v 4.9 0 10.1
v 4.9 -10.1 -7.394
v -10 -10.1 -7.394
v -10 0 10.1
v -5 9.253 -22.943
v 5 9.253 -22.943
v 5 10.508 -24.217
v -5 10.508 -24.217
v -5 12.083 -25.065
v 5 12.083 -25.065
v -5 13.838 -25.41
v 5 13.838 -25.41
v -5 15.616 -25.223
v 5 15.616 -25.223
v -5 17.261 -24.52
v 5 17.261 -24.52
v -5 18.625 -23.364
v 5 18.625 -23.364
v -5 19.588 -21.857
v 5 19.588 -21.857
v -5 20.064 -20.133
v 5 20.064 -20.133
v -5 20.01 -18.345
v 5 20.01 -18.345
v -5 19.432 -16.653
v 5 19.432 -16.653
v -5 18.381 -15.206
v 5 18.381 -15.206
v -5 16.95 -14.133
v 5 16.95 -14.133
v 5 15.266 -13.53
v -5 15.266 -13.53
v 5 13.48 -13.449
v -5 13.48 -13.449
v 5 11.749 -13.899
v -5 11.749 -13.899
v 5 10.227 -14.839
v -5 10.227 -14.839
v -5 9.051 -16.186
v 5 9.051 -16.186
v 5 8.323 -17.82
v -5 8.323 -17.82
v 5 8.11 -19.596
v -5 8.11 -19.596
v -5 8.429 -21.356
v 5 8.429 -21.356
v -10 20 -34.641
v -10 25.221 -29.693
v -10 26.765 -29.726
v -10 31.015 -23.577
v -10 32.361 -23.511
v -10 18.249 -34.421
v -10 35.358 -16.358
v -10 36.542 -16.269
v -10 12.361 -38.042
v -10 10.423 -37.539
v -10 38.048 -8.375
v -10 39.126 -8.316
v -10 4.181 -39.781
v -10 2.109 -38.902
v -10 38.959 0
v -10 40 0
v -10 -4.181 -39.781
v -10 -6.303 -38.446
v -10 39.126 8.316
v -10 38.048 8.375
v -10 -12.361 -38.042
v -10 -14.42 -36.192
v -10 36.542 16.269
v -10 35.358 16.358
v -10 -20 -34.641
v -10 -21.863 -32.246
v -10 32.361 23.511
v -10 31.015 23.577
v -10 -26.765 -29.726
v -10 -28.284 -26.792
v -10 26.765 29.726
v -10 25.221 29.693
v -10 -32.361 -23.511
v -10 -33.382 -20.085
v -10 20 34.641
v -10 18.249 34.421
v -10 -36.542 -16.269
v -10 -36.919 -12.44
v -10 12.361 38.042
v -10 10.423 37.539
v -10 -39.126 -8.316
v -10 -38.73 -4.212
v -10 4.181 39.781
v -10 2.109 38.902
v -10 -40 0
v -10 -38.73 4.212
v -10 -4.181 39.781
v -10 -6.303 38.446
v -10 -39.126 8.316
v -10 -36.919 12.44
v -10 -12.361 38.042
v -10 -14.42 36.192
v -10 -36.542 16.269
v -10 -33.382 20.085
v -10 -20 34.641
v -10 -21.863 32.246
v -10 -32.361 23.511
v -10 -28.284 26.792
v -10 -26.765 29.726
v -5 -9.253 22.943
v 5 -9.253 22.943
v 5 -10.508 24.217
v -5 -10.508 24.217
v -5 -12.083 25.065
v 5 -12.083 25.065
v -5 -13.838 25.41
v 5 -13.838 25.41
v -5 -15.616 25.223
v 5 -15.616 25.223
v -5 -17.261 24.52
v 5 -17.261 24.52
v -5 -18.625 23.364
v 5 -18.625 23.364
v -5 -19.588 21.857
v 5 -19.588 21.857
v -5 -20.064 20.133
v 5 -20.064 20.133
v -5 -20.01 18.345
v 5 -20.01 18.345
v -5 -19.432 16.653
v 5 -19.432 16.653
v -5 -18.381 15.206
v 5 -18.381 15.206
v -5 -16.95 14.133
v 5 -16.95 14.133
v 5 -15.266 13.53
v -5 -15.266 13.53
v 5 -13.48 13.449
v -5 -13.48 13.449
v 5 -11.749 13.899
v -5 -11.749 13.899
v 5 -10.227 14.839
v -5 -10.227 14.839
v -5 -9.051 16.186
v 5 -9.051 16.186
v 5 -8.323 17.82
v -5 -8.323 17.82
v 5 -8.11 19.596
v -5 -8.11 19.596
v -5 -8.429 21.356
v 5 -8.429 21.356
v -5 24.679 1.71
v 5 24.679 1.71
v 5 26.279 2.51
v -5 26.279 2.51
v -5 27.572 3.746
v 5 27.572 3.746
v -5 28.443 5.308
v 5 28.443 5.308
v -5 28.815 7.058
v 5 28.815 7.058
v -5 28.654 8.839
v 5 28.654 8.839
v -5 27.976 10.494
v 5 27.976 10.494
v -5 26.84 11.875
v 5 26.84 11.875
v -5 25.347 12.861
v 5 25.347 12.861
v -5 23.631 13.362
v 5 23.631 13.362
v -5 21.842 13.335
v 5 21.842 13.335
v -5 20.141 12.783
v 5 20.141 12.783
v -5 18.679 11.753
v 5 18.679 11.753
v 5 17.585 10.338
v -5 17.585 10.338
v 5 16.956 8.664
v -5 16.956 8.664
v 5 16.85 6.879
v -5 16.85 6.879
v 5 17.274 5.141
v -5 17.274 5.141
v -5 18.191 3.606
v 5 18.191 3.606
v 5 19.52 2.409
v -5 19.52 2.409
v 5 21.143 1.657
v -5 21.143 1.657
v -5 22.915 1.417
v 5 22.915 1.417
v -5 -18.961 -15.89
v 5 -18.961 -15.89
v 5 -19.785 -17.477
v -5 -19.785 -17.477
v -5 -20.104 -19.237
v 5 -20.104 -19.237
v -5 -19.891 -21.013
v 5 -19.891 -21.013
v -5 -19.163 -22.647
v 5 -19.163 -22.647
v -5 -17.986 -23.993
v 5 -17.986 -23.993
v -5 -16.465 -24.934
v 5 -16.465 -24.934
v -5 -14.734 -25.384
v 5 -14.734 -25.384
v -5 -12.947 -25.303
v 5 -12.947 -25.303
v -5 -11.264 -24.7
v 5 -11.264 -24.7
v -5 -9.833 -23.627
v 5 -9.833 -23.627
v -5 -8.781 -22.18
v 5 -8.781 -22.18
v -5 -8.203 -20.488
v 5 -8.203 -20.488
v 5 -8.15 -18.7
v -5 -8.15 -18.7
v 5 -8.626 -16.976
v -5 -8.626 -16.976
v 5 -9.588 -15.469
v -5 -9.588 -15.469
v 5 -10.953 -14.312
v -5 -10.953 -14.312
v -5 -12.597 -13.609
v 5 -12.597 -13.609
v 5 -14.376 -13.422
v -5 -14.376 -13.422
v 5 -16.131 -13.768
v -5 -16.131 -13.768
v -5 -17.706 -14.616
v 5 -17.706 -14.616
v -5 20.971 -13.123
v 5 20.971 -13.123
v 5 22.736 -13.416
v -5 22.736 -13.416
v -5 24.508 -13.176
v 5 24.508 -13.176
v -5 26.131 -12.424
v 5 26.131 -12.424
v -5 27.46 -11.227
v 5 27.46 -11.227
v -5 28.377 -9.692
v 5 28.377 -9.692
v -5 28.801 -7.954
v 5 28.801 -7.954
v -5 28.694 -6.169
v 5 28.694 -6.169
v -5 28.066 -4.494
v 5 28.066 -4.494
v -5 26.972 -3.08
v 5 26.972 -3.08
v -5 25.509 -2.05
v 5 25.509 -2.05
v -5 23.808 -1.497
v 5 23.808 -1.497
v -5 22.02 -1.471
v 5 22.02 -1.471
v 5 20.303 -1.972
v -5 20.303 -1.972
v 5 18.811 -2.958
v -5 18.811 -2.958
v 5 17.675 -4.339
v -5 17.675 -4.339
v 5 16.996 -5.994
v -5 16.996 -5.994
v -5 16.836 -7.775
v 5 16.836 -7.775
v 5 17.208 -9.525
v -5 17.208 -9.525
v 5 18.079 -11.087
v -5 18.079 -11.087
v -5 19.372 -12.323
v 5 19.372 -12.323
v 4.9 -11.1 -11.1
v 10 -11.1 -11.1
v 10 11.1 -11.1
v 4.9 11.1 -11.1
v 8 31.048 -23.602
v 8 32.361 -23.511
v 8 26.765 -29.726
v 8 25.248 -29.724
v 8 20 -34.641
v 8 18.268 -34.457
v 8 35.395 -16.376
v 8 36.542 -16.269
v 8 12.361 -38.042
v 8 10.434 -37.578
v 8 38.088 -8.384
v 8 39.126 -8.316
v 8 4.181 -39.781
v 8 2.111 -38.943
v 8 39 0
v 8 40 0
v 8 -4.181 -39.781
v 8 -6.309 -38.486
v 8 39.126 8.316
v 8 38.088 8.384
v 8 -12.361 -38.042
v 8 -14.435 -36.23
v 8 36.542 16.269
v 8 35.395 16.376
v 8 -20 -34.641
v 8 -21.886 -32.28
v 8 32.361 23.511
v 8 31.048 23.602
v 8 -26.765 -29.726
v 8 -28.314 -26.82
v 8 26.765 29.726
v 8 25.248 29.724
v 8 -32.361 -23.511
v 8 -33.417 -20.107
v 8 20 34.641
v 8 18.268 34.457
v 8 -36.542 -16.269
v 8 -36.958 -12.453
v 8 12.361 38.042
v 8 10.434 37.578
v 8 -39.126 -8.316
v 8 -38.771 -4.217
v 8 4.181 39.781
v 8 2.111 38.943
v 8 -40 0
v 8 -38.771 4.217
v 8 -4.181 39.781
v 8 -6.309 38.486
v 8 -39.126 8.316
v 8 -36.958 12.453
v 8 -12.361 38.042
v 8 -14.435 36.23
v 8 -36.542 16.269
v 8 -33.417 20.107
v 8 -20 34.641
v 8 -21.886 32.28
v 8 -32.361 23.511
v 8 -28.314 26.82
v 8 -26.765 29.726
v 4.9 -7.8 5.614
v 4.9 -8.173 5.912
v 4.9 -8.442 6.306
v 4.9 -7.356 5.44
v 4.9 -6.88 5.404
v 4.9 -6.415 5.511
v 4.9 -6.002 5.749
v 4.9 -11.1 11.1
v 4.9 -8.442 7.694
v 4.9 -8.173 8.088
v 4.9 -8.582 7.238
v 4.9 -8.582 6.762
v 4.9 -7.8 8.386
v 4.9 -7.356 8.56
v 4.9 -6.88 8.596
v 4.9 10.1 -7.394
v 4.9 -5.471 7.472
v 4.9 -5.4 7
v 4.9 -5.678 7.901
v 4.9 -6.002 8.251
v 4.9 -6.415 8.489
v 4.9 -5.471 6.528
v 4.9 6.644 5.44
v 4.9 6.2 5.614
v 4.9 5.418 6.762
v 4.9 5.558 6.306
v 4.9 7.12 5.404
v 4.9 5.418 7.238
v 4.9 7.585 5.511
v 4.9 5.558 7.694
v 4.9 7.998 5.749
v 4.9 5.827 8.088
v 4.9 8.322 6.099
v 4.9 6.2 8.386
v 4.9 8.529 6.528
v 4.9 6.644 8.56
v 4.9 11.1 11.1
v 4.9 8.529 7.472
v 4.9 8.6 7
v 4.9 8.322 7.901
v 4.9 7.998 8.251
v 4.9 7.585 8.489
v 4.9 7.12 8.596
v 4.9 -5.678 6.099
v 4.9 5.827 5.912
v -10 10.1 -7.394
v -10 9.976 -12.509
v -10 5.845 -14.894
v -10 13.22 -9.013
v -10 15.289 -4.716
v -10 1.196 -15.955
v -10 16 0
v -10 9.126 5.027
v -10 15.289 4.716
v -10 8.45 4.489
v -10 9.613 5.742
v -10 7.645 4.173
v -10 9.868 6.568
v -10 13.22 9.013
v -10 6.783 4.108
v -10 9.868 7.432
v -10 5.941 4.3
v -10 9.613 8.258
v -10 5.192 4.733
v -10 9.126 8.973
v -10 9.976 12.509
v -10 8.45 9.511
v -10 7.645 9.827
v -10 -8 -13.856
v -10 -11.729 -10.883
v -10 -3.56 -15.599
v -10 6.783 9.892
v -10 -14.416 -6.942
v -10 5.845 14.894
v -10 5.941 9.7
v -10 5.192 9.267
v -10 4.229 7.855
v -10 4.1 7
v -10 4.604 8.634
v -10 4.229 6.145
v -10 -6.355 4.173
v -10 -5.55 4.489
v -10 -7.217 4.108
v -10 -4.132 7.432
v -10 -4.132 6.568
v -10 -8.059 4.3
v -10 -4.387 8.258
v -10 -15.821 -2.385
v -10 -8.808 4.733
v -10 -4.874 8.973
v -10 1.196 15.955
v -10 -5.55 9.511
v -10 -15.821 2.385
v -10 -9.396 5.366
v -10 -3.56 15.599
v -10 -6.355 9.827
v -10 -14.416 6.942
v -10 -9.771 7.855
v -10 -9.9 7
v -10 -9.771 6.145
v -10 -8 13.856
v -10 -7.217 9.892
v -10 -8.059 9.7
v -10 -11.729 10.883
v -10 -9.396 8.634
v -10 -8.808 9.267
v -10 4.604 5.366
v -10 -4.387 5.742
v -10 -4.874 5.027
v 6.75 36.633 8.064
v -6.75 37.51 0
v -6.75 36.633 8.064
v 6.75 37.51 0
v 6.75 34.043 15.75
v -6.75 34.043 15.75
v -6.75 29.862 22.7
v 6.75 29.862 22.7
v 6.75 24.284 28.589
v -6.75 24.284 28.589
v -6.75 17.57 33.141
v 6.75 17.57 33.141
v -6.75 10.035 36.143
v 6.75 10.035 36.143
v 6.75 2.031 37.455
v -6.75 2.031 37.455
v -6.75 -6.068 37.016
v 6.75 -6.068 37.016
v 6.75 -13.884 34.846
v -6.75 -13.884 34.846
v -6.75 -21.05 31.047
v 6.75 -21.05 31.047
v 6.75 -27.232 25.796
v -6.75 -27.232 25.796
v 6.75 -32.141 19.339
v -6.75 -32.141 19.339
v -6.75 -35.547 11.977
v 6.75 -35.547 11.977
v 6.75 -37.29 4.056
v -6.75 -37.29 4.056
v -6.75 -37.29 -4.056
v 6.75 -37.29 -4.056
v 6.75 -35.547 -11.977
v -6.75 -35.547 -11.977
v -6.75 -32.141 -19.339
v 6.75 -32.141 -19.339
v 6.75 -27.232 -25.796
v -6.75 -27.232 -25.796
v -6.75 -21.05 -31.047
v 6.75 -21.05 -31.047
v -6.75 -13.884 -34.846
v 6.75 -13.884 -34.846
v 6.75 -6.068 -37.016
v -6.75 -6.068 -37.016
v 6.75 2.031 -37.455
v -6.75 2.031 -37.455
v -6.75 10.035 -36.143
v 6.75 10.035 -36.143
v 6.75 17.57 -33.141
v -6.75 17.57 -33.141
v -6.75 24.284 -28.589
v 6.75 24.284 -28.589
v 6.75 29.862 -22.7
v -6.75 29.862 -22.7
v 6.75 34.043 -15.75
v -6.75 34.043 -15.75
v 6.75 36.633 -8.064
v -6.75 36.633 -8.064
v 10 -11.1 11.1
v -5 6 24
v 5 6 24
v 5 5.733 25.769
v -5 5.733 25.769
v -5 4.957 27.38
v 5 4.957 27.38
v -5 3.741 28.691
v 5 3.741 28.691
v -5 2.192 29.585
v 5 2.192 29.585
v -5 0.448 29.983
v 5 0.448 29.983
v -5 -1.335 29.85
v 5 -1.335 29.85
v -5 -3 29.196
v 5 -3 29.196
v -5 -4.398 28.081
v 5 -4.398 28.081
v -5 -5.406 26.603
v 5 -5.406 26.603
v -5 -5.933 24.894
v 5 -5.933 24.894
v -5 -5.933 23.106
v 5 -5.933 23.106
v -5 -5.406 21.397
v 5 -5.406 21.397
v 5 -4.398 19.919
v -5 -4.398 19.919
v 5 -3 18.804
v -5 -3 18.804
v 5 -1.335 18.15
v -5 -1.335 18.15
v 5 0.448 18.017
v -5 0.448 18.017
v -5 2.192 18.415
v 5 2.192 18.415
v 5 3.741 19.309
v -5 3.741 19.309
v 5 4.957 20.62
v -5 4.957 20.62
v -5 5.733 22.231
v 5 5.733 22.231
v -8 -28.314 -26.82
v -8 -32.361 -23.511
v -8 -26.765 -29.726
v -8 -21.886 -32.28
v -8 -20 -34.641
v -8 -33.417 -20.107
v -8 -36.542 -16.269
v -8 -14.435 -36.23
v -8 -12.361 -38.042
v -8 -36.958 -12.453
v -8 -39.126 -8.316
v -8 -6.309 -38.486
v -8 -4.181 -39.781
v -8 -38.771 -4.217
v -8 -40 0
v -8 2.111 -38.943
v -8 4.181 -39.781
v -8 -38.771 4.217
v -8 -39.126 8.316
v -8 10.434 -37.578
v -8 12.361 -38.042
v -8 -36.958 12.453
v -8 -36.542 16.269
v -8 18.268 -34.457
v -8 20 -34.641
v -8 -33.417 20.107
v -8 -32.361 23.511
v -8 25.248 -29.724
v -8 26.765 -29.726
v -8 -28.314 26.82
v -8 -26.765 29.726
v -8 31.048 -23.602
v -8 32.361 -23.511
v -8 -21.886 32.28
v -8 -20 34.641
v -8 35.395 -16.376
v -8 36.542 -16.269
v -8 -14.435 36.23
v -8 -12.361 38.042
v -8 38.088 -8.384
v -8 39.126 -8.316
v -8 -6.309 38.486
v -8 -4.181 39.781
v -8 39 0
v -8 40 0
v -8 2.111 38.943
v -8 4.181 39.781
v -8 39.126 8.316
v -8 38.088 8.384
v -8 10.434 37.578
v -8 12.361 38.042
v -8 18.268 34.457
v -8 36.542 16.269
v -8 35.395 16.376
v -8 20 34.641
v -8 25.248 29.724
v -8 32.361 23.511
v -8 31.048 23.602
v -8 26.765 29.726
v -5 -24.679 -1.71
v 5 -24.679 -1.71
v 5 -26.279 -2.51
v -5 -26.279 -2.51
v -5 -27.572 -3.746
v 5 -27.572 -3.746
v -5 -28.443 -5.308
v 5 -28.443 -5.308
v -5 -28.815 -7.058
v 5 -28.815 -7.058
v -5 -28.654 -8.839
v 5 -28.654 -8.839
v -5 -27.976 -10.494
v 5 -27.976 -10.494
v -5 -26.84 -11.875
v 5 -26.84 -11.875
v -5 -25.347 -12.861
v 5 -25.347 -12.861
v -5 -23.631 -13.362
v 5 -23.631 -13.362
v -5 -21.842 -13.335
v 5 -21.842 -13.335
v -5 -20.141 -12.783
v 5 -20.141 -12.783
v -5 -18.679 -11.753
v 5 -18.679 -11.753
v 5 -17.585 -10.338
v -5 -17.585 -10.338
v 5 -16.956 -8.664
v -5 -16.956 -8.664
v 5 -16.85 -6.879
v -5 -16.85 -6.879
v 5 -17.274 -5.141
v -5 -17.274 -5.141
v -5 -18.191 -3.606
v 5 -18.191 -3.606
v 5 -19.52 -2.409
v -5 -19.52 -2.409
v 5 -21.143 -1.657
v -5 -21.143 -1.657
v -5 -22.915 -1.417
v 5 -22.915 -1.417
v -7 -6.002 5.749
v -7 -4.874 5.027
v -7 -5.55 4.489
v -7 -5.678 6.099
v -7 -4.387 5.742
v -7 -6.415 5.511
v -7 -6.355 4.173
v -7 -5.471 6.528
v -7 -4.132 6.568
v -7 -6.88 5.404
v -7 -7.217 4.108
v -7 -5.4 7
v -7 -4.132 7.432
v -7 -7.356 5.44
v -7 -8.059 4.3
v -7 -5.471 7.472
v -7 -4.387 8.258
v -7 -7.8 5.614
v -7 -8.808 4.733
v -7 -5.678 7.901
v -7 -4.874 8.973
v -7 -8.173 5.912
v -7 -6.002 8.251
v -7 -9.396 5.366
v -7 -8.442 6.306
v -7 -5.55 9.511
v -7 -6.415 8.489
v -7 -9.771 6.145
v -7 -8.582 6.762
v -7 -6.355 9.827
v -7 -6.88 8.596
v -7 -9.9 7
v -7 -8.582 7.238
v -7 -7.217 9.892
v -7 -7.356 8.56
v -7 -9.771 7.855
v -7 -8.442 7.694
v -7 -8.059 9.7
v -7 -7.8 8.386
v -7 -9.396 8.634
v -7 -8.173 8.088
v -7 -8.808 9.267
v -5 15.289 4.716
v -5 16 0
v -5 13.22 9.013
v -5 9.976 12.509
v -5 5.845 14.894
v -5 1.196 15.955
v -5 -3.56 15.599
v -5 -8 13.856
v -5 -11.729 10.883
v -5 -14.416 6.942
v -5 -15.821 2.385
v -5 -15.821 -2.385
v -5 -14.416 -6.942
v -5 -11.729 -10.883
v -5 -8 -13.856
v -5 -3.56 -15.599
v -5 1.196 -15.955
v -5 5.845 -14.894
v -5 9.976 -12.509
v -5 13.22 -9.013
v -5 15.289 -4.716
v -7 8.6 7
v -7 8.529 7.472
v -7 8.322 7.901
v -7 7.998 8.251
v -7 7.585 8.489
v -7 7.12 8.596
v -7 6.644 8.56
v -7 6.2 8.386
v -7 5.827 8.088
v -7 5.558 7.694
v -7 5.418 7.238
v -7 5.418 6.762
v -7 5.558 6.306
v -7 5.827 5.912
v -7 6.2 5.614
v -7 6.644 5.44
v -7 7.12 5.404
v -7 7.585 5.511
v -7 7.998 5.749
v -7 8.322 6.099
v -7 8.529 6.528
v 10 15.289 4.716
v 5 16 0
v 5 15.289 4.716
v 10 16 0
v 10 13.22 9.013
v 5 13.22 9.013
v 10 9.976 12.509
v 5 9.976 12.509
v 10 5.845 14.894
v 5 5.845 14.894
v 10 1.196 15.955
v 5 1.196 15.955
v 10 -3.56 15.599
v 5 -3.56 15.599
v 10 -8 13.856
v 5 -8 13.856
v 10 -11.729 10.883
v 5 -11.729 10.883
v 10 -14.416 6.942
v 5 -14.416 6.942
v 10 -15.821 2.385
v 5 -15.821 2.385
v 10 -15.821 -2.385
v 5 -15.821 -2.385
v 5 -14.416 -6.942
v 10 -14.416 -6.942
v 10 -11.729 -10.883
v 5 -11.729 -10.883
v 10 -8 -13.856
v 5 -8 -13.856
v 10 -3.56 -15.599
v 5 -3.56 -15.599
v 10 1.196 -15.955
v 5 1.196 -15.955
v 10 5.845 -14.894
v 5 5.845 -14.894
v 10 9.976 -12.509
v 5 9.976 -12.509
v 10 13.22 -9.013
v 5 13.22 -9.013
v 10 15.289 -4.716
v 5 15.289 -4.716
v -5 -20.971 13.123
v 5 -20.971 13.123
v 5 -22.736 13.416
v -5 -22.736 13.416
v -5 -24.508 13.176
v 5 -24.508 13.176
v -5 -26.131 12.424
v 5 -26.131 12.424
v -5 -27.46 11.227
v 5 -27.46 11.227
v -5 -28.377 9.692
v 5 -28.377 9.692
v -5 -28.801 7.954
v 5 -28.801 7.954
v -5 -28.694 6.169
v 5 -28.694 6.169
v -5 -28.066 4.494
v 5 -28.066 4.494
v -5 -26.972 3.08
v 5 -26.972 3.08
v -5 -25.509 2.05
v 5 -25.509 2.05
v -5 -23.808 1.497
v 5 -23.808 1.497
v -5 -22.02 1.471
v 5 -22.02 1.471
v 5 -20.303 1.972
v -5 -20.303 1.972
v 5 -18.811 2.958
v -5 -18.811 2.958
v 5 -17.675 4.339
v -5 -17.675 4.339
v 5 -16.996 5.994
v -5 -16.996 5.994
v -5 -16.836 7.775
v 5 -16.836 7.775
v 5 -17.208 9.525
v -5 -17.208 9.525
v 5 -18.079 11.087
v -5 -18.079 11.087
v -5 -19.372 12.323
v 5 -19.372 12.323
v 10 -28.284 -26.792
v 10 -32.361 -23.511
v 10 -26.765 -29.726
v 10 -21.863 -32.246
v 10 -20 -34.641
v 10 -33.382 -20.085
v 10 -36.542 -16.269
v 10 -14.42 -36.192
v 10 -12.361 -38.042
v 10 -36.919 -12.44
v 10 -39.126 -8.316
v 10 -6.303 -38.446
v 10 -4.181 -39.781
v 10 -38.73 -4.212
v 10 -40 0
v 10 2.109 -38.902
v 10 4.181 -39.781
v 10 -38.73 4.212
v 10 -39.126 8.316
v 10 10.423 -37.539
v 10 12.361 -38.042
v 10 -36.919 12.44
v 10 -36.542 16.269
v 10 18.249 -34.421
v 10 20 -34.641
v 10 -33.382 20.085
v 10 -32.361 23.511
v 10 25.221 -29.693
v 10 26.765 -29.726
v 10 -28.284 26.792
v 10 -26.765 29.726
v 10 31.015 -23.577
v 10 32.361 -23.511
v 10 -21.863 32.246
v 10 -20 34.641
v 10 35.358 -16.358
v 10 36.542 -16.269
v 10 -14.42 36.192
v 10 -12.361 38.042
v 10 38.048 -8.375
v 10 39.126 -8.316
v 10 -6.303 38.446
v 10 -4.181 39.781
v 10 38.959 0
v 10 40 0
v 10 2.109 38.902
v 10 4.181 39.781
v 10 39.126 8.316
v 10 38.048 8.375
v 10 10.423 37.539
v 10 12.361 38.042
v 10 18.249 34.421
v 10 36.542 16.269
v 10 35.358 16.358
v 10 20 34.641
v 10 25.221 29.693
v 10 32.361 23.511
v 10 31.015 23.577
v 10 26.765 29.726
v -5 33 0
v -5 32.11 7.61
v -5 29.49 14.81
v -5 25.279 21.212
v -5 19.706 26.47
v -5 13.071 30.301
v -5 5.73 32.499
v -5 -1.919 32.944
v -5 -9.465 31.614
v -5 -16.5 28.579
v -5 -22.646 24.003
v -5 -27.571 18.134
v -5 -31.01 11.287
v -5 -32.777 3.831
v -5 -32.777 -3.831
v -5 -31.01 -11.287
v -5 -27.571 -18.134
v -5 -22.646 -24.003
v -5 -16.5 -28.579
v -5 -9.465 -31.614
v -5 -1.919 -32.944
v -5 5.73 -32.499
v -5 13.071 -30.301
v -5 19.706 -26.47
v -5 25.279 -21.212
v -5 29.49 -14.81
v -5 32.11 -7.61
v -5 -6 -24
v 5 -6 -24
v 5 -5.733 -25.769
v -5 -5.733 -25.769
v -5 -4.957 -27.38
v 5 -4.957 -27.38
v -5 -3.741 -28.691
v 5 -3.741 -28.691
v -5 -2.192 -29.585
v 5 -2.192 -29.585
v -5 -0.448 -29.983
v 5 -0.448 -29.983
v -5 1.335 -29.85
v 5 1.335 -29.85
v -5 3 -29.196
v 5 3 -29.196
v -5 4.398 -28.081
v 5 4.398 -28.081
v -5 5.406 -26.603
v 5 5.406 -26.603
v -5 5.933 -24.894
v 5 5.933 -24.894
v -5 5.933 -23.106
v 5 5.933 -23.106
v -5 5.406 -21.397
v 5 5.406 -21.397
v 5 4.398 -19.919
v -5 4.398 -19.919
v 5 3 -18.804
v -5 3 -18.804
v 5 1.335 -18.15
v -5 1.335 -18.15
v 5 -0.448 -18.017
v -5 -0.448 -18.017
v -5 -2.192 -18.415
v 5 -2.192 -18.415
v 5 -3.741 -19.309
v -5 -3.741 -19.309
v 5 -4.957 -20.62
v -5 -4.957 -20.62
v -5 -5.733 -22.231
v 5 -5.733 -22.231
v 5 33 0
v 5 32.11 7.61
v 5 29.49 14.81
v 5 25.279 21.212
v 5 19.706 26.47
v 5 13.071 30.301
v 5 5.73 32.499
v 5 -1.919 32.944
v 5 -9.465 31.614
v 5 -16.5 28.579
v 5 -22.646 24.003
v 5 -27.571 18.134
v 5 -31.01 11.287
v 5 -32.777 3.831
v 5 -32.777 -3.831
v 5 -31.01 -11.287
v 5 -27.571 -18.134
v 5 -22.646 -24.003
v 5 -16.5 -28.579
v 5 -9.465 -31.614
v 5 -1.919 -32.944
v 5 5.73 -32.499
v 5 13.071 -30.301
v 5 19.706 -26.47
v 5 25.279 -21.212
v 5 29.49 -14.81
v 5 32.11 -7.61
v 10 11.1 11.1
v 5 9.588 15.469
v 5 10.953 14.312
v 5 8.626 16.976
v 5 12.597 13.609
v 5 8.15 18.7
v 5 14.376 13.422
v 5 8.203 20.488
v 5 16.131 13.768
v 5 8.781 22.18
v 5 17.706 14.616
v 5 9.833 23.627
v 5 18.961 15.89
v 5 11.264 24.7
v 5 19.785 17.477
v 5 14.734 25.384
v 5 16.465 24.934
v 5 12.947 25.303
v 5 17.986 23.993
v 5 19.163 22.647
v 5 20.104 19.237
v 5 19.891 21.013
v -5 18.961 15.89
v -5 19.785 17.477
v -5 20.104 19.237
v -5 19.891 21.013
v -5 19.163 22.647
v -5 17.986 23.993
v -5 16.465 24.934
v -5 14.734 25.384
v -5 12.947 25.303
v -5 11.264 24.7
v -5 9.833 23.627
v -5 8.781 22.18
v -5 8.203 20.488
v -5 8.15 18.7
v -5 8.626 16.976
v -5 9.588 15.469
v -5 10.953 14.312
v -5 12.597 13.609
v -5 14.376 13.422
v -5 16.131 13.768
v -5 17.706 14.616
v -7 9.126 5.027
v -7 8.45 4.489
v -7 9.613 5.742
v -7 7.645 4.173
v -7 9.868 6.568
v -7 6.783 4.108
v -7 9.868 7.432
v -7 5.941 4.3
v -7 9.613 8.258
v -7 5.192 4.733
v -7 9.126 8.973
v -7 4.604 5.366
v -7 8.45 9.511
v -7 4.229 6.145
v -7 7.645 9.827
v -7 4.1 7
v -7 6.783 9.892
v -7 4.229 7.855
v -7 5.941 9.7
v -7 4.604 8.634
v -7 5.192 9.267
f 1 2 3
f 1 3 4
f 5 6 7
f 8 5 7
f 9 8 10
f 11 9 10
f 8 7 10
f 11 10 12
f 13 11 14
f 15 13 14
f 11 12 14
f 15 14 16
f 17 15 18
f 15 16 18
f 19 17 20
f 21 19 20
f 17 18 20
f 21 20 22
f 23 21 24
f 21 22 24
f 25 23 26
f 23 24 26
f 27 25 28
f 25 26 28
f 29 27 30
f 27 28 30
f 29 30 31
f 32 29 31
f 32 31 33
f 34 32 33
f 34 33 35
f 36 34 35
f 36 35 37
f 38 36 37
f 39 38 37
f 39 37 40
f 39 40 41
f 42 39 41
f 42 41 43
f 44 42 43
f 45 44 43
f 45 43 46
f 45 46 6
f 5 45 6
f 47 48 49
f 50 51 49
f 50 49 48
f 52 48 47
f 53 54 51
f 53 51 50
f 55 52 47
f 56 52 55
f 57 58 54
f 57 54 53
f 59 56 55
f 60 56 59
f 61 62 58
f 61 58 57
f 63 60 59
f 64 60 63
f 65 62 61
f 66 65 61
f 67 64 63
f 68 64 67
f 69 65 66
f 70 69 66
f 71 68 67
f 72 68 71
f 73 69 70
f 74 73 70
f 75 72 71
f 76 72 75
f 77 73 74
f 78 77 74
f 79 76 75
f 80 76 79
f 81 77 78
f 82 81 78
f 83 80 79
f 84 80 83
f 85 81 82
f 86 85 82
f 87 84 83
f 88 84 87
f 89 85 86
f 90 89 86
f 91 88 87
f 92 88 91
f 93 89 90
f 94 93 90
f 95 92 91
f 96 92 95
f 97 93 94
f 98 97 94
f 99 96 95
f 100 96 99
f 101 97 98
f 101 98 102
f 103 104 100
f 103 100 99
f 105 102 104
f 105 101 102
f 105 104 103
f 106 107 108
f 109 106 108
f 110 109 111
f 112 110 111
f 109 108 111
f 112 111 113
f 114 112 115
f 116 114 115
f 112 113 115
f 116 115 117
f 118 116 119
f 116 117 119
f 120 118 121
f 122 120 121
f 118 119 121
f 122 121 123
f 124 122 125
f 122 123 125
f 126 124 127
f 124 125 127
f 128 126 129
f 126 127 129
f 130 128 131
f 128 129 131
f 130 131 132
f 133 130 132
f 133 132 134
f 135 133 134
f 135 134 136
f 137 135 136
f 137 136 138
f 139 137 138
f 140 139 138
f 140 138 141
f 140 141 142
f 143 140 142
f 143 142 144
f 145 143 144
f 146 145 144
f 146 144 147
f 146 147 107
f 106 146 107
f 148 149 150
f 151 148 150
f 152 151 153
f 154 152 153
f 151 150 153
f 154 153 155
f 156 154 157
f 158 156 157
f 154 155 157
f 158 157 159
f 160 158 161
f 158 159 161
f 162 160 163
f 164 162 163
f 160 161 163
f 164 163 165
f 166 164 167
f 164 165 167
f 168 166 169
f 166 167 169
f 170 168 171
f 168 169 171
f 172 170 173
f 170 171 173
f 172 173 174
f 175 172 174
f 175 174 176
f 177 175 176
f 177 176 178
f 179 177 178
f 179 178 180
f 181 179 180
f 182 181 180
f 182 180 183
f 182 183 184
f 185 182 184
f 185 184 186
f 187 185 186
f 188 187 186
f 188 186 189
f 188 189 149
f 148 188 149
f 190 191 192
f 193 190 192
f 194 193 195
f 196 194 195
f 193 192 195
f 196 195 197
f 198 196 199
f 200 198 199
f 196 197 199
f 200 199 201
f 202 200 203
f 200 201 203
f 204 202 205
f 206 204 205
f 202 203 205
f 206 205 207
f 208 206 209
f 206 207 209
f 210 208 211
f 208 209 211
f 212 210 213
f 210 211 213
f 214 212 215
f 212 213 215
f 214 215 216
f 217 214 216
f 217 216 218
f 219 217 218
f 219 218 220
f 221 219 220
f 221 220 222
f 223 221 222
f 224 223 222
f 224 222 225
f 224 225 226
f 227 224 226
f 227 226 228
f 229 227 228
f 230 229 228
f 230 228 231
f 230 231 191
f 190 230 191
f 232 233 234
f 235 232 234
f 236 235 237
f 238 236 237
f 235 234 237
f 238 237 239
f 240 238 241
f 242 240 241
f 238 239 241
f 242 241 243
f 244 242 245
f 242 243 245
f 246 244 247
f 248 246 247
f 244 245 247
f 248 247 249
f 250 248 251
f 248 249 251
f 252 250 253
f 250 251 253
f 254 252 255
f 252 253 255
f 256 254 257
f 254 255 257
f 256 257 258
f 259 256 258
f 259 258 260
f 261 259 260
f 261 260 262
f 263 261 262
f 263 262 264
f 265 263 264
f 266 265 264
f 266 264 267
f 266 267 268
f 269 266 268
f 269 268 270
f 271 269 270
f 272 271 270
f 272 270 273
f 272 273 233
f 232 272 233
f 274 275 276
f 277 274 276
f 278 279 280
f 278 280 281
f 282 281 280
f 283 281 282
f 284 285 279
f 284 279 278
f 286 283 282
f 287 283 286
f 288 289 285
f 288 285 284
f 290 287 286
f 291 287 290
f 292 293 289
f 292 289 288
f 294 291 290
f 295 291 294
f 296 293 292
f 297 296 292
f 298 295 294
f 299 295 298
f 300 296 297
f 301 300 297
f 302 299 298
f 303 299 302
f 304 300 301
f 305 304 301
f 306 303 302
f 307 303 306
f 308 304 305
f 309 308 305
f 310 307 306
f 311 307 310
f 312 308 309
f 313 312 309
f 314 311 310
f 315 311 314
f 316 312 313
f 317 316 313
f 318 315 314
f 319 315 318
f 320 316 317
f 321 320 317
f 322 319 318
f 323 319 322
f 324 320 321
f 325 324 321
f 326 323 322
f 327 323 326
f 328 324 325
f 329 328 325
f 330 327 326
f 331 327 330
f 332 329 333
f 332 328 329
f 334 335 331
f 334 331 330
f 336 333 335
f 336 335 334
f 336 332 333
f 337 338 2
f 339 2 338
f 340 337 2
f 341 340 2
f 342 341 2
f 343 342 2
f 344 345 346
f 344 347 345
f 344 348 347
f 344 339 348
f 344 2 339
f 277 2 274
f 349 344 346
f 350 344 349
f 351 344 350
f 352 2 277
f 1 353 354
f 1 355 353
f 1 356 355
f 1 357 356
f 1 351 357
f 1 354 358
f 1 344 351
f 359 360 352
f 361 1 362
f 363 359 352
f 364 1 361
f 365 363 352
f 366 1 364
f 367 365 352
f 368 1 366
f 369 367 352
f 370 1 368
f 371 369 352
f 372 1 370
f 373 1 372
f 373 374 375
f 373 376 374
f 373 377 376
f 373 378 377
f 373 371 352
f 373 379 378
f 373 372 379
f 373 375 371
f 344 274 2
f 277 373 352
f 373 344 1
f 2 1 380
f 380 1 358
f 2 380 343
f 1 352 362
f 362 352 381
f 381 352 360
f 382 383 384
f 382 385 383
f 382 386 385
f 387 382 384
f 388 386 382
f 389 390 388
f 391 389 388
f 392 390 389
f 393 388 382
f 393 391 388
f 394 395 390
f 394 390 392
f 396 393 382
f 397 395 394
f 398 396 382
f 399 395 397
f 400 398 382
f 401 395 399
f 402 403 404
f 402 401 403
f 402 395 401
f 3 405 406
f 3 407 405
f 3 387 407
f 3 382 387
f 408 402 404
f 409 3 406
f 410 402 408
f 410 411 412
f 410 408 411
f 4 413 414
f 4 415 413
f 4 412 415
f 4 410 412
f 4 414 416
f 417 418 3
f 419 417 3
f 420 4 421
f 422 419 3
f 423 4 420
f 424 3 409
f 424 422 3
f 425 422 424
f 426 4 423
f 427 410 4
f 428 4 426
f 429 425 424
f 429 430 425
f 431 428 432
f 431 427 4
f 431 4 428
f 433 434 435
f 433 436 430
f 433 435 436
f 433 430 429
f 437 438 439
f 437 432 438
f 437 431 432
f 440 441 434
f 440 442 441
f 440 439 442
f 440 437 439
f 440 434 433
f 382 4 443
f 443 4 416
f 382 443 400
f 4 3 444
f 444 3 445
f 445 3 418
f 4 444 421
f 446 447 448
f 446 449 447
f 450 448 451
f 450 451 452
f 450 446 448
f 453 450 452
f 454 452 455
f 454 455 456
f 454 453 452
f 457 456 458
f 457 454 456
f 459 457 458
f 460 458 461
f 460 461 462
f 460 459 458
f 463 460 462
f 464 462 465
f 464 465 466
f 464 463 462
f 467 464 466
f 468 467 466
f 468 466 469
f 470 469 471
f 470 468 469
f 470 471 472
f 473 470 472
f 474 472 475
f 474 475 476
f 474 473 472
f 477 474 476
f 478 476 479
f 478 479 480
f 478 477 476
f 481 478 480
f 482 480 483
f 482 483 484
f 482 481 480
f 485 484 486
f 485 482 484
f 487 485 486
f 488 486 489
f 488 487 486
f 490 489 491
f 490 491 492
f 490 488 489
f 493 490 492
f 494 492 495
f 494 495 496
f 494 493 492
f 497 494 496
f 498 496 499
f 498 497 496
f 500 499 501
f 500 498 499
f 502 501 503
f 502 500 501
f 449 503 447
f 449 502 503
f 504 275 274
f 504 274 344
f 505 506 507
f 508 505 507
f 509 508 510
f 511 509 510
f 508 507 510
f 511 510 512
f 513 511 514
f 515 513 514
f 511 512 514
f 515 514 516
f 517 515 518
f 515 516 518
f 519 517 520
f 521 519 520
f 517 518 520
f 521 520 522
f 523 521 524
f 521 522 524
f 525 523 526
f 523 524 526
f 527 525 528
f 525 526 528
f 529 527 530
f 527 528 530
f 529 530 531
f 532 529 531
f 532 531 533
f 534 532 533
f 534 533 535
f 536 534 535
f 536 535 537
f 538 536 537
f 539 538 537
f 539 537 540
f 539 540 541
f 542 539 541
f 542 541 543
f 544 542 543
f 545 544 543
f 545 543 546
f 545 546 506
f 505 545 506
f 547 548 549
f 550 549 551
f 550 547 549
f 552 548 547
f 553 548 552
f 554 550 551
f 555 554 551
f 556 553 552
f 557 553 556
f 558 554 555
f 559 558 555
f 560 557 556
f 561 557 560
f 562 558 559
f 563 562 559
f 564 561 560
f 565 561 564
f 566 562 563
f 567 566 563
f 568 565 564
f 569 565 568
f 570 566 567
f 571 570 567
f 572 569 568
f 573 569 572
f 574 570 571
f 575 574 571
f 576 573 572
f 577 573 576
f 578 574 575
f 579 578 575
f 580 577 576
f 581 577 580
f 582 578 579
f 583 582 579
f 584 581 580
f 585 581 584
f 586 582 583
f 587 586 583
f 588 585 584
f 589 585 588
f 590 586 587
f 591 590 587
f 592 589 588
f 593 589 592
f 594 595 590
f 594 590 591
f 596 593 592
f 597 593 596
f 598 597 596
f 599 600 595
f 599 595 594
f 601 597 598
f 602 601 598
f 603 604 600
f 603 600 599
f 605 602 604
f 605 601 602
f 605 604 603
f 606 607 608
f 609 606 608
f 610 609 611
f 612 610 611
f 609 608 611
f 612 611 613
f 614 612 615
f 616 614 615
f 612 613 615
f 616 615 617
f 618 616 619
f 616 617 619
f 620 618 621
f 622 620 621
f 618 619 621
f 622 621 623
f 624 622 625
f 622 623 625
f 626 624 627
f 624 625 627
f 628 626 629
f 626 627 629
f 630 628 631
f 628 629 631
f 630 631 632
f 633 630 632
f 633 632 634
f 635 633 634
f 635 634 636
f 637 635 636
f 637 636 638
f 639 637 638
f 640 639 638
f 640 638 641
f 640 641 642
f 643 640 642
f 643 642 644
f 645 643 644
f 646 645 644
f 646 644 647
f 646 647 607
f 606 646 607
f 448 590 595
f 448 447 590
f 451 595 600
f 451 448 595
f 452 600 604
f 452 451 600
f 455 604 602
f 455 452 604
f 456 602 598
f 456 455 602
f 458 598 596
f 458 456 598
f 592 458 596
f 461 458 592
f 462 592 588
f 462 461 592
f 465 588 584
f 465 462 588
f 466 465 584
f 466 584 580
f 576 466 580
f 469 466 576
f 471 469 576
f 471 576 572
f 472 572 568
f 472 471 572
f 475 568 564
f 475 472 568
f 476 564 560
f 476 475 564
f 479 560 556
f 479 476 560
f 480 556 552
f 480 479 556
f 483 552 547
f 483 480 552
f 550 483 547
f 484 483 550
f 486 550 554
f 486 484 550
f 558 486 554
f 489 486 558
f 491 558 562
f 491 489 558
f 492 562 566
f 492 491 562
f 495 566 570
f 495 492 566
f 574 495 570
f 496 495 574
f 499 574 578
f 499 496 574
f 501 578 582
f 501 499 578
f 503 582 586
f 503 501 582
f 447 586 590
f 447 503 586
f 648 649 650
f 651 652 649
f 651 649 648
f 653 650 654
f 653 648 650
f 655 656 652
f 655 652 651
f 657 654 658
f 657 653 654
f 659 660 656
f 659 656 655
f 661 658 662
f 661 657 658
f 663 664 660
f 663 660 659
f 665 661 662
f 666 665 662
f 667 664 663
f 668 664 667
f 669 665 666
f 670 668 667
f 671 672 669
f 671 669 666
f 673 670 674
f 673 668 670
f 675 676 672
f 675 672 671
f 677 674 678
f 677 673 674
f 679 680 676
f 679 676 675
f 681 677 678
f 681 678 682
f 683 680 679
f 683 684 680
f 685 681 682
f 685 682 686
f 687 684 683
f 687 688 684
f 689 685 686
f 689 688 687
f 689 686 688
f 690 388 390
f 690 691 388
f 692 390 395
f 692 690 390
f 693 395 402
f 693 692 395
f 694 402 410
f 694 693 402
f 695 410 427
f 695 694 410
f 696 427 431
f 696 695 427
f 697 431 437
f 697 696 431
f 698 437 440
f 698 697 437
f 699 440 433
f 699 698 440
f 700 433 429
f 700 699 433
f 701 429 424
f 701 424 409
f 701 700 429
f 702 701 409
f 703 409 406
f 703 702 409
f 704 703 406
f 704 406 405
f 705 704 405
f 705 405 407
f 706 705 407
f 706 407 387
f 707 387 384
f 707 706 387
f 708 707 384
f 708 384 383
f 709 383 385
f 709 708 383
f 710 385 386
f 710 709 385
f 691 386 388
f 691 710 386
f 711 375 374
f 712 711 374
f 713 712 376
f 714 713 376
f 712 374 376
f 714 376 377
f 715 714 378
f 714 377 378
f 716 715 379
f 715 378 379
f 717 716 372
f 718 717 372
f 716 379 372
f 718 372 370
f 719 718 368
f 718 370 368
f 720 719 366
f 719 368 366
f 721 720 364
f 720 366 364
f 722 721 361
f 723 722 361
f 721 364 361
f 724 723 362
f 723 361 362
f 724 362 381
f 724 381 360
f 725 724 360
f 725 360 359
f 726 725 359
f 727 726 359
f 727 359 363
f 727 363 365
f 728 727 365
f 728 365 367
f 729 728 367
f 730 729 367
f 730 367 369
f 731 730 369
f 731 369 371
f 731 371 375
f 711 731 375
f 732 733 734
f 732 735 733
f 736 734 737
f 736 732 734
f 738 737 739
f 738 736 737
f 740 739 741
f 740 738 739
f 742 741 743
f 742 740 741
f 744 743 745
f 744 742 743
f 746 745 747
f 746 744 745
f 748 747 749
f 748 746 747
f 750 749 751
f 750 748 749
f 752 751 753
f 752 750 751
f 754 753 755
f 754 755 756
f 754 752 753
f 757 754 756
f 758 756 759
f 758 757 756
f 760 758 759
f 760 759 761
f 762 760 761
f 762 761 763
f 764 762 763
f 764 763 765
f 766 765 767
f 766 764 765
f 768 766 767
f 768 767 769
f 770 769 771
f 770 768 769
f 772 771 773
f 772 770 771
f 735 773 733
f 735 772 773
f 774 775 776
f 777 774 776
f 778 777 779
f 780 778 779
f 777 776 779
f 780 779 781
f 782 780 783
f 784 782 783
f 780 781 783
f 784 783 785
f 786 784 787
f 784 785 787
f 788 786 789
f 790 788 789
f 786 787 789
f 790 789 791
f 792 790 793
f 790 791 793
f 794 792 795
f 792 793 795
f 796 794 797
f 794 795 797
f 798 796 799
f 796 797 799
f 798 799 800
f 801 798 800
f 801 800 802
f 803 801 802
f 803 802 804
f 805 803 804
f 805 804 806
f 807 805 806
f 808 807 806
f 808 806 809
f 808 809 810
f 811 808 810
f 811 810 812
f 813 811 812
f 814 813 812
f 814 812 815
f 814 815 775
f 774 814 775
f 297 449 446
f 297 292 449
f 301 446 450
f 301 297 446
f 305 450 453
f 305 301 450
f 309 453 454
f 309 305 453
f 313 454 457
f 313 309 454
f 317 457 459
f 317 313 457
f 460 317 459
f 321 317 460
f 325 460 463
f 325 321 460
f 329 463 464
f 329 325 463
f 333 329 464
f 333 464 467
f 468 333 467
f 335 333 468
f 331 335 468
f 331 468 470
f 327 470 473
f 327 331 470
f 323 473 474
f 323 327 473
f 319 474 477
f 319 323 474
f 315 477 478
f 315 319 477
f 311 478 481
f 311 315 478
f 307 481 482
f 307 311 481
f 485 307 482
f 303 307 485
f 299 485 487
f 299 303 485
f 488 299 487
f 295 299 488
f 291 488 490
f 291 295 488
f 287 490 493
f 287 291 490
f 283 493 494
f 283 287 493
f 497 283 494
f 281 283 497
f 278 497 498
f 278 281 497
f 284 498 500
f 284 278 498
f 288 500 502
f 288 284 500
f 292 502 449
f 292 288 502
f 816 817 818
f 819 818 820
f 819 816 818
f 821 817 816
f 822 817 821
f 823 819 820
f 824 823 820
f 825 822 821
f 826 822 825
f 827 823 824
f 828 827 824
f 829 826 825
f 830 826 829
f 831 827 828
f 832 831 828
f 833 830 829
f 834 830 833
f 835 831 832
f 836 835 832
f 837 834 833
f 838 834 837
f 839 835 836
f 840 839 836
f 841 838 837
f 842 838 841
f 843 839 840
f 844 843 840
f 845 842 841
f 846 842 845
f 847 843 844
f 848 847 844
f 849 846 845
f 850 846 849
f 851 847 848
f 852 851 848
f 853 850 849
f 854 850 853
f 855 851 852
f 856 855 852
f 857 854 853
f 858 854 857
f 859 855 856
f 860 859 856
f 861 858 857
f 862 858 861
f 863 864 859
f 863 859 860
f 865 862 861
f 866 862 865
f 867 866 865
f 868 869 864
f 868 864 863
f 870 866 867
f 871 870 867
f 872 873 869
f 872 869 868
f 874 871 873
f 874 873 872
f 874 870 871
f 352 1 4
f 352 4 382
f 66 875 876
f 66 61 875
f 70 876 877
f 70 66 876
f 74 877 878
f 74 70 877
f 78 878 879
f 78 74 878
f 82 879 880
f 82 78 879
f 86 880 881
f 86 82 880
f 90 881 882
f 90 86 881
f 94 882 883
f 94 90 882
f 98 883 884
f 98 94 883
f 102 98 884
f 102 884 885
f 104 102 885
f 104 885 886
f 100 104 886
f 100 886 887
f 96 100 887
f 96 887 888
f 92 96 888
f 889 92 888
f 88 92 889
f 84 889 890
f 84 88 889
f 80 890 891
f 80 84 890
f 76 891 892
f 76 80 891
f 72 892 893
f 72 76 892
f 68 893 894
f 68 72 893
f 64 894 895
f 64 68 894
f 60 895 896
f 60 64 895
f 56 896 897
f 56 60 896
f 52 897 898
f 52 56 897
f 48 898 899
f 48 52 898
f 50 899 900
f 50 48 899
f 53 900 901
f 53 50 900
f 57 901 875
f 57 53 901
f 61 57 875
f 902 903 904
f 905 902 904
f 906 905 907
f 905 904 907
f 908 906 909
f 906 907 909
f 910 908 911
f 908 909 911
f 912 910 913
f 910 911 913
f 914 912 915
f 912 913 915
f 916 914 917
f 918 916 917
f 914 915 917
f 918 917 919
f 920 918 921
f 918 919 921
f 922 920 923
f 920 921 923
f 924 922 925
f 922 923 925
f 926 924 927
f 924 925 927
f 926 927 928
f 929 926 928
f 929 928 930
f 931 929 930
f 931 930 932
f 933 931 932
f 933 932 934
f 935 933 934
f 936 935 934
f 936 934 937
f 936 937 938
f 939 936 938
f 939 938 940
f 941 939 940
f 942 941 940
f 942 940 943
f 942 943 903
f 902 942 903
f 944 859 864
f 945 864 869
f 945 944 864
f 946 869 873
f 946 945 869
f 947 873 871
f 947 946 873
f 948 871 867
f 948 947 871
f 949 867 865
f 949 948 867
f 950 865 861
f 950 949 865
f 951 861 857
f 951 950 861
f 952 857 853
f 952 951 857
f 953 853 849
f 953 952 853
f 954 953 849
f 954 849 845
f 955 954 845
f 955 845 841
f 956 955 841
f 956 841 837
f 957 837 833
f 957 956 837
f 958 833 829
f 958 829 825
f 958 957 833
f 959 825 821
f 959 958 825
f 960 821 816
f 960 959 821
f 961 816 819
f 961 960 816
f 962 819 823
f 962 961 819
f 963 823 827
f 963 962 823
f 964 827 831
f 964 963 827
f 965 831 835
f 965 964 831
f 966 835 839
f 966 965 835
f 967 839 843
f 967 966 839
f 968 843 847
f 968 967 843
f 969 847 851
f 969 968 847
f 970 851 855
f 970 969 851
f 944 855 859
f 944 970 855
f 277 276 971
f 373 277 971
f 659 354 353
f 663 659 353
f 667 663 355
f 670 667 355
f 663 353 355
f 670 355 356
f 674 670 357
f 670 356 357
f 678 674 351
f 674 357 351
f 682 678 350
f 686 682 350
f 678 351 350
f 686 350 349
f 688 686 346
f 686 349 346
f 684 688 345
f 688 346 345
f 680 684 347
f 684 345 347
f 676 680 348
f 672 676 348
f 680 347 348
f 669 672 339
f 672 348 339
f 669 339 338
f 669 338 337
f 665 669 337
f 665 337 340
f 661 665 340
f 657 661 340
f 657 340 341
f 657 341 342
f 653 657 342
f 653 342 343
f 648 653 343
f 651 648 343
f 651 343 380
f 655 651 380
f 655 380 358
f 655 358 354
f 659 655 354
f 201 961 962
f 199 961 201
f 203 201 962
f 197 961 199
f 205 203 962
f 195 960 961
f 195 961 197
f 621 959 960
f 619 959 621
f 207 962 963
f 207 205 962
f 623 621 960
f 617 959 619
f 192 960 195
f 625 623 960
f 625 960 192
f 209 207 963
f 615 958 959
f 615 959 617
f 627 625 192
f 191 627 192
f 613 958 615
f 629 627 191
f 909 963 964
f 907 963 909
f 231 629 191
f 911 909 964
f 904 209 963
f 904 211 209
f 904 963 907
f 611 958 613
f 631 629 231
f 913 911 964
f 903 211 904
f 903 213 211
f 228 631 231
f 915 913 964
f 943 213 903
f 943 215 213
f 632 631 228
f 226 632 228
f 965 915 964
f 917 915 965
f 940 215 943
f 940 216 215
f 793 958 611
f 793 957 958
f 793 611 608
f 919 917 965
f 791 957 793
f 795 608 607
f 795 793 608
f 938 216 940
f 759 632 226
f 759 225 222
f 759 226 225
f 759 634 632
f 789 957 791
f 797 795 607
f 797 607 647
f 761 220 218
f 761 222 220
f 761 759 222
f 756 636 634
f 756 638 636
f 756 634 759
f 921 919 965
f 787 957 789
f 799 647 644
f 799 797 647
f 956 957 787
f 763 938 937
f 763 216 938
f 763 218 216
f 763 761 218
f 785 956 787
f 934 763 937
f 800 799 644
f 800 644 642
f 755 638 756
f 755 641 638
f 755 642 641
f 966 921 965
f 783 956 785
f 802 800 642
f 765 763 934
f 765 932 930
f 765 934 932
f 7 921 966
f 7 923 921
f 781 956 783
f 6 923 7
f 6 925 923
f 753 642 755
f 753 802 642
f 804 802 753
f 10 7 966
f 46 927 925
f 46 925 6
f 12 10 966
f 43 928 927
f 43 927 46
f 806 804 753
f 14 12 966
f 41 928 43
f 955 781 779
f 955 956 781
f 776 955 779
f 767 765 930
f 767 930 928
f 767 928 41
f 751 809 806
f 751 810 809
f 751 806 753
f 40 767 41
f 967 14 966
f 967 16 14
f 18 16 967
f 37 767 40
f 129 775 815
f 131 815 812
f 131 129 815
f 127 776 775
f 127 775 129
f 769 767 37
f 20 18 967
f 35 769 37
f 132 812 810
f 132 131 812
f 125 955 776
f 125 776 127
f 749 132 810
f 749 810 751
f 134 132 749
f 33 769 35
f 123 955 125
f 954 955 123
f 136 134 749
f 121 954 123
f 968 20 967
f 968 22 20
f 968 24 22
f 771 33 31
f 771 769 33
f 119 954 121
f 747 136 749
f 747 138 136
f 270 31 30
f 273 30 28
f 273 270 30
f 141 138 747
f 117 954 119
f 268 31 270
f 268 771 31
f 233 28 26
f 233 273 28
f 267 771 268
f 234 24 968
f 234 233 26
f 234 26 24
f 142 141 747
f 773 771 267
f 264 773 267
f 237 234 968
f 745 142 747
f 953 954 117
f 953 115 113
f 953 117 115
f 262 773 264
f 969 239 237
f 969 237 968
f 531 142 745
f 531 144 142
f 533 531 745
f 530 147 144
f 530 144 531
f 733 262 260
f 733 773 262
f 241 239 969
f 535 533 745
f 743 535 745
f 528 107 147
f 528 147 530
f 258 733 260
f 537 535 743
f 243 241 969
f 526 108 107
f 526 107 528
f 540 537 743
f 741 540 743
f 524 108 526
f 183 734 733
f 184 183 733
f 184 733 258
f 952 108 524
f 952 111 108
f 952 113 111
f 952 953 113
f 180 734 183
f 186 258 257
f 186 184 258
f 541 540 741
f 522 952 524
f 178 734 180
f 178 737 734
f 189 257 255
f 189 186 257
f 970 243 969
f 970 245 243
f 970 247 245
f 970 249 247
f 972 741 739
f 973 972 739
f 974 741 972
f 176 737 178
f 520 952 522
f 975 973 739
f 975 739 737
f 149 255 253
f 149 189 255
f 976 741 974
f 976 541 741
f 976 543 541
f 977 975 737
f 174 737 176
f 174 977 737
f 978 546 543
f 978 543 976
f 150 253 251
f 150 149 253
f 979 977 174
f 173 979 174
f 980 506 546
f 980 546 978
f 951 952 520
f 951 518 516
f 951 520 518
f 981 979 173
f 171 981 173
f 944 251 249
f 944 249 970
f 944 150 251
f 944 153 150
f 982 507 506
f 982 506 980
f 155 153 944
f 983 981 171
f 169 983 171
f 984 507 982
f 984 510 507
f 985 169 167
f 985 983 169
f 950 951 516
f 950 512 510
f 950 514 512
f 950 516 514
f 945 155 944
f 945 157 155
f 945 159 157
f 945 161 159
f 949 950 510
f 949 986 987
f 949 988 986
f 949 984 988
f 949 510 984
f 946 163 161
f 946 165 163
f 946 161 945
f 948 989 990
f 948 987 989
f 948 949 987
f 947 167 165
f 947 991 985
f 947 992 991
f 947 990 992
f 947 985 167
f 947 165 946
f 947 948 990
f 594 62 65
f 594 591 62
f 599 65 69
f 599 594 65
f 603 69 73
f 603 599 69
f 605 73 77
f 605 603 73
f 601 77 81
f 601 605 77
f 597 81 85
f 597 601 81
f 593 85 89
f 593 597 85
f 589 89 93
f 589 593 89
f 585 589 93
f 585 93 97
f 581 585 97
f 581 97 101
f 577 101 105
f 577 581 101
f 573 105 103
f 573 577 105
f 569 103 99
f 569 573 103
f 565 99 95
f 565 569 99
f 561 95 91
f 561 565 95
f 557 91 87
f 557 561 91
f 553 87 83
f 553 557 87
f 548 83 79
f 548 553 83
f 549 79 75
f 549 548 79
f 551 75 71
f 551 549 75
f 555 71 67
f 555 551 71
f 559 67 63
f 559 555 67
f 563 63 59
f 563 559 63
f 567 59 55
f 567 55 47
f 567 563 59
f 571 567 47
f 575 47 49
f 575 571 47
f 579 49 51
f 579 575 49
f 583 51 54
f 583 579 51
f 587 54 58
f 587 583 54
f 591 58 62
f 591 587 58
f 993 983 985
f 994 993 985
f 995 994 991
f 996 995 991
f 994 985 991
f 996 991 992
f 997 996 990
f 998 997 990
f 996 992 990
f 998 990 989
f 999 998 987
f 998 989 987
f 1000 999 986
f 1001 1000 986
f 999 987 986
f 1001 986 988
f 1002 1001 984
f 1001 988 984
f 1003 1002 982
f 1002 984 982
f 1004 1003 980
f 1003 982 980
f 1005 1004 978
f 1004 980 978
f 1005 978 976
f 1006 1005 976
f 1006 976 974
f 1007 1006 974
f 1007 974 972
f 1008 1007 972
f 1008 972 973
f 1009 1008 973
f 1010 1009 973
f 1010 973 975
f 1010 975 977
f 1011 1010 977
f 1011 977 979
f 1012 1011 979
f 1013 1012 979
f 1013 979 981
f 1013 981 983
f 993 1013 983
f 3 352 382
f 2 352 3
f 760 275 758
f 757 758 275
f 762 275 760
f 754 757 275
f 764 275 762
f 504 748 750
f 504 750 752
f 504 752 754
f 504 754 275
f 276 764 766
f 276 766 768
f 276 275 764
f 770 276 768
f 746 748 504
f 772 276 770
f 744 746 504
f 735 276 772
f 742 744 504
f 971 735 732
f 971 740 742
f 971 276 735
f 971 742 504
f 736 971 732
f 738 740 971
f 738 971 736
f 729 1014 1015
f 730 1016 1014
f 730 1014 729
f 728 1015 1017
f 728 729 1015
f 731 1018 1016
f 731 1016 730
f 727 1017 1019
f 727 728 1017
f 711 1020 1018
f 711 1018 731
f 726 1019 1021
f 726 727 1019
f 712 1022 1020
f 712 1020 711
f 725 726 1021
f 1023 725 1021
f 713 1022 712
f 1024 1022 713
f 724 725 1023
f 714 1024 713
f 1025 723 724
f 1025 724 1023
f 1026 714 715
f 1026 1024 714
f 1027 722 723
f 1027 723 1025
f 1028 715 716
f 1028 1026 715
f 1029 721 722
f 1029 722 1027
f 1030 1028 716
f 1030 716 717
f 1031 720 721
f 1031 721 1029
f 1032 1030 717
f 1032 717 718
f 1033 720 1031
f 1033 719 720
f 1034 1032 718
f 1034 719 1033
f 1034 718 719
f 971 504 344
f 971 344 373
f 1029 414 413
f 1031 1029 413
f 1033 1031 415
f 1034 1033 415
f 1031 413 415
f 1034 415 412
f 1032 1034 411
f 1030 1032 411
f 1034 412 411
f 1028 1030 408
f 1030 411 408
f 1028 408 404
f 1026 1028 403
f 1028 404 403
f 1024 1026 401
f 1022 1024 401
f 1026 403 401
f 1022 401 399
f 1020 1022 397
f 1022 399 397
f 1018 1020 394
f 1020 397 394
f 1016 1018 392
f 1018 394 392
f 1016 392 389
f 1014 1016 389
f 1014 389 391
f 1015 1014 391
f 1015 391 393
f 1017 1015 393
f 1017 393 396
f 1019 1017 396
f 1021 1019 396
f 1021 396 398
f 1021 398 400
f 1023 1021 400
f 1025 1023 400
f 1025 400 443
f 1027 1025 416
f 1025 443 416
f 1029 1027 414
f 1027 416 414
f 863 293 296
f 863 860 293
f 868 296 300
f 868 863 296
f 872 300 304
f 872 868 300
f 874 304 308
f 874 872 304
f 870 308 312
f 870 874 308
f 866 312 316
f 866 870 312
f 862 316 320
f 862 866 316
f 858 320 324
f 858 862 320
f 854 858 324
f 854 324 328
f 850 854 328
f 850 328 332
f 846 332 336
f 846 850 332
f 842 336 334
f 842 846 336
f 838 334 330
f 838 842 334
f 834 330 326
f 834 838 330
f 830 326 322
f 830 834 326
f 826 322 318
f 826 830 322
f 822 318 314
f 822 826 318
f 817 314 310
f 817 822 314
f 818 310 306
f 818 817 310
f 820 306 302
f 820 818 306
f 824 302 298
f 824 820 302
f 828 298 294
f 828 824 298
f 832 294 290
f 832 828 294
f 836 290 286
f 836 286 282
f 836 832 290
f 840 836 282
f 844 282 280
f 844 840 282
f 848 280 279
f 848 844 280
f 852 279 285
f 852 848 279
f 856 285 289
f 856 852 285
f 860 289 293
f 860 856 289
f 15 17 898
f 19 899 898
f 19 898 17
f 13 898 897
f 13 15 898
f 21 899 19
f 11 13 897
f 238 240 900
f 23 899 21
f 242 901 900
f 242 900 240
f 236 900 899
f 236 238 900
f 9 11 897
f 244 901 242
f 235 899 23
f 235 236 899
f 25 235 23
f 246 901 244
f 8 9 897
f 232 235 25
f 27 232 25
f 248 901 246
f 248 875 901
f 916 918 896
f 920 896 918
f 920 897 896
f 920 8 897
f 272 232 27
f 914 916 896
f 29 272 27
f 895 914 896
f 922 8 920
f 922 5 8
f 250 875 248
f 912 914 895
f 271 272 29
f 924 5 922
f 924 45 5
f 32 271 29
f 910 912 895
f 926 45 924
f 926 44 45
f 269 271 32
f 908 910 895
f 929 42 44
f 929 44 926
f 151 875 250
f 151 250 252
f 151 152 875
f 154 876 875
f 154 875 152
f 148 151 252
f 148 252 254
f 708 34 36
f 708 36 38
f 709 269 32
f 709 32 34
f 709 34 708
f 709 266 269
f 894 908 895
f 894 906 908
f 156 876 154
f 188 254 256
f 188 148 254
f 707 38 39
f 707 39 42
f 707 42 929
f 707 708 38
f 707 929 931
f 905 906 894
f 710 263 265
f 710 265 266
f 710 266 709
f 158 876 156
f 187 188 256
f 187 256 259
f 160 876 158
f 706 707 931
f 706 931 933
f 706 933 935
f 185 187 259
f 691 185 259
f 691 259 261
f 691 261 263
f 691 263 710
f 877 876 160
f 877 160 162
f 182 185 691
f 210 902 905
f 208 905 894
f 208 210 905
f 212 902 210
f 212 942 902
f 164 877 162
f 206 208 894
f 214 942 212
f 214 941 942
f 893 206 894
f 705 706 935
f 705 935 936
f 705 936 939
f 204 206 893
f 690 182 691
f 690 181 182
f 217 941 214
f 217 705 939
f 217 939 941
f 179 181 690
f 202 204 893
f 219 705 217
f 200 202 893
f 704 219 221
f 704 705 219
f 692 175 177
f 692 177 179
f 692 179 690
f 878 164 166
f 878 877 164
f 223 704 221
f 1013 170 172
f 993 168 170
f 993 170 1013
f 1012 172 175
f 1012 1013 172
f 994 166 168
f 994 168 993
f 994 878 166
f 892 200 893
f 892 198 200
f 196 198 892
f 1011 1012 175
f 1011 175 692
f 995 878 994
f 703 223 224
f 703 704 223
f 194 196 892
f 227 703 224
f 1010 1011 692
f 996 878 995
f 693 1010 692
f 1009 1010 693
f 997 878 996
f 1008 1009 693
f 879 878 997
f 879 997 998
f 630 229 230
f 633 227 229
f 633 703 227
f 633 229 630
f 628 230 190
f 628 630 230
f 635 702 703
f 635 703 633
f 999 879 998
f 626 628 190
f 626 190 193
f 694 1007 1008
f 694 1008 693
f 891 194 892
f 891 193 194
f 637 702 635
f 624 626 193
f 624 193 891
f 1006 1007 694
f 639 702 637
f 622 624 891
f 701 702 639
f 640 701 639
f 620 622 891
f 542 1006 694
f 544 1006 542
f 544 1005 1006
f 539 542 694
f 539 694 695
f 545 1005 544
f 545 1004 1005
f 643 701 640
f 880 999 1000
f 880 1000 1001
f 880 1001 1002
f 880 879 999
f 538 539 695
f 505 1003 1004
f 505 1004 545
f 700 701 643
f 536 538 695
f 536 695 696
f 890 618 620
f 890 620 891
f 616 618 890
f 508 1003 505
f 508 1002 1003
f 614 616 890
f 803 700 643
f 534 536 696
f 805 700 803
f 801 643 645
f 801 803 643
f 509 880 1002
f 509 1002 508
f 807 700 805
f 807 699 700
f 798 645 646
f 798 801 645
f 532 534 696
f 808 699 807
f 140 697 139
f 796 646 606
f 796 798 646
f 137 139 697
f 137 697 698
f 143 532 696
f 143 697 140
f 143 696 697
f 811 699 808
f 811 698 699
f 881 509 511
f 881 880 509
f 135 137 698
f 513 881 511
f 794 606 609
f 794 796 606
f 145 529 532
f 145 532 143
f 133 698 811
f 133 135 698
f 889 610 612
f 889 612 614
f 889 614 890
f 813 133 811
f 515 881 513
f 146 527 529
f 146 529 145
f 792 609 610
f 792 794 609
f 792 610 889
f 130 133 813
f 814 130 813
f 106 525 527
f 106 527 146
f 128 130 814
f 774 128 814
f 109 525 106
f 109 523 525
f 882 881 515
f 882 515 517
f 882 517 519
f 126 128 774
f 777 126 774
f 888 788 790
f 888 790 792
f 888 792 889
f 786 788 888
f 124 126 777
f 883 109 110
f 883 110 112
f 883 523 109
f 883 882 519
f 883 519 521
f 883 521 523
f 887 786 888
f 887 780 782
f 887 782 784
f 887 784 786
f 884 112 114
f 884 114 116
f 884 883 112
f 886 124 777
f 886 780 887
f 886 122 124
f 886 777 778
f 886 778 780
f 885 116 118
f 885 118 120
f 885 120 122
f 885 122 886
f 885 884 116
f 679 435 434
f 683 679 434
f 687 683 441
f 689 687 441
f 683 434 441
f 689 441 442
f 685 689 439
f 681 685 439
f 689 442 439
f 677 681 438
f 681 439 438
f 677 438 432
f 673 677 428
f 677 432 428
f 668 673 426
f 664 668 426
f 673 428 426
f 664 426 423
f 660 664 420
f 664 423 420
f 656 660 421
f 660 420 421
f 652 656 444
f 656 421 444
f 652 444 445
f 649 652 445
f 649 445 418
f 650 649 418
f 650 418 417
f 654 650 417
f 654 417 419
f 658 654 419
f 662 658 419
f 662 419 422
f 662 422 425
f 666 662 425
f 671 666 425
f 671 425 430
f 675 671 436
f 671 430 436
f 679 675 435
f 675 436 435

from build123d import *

# Parameters (mm, degrees)
SKETCH001_R        = 1.6
POCKET_DEPTH       = 20.001
SKETCH003_W        = 22.2
SKETCH003_H        = 22.2
POCKET001_DEPTH    = 5.1
SKETCH004_R        = 2.9
POCKET002_DEPTH    = 3
SKETCH005_R        = 6
POCKET003_DEPTH    = 244.783506
POLARPATTERN_COUNT = 10


with BuildPart() as part:
    # Sketch → Revolution (revolve)
    with BuildSketch(Plane.XY):
        Polygon((8, 39), (8, 40), (10, 40), (10, 38.958768), (5, 33), (5, 16), (10, 16), (10, 1), (-10, 1), (-10, 16), (-5, 16), (-5, 33), (-10, 38.958768), (-10, 40), (-8, 40), (-8, 39), (-6.75, 37.510308), (6.75, 37.510308), align=None)
    revolve(axis=Axis((0, 0, 0), (1, 0, 0)))

    # Sketch001 (on Face7 of Revolution) → Pocket (cut, through all)
    with BuildSketch(Plane.YZ.offset(10)):
        with Locations((-7, 7)):
            Circle(SKETCH001_R)
        with Locations((7, 7)):
            Circle(SKETCH001_R)
        Polygon((-10.1, -7.393713), (0, 10.1), (10.1, -7.393713), align=None)
    extrude(amount=-POCKET_DEPTH, mode=Mode.SUBTRACT)

    # Sketch003 (on Face13 of Pocket) → Pocket001 (cut)
    with BuildSketch(Plane.YZ.offset(10)):
        Rectangle(SKETCH003_W, SKETCH003_H)
    extrude(amount=-POCKET001_DEPTH, mode=Mode.SUBTRACT)

    # Sketch004 (on Face27 of Pocket001) → Pocket002 (cut)
    with BuildSketch(Plane(origin=(-10, 0, 0), x_dir=(0, -1, 0), z_dir=(-1, 0, 0))):
        with Locations((-7, 7)):
            Circle(SKETCH004_R)
        with Locations((7, 7)):
            Circle(SKETCH004_R)
    extrude(amount=-POCKET002_DEPTH, mode=Mode.SUBTRACT)

    # Sketch005 (on Face9 of Pocket002) → Pocket003 (cut, through all)
    with BuildSketch(Plane.YZ.offset(5)):
        with Locations((0, 24)):
            Circle(SKETCH005_R)
    pocket003 = extrude(amount=-POCKET003_DEPTH, mode=Mode.SUBTRACT)

    # PolarPattern: Pocket003 ×10 about axis
    polarpattern_axis = Axis((5, 0, 0), (1, 0, 0))
    for i in range(1, POLARPATTERN_COUNT):
        add(pocket003.rotate(polarpattern_axis, i * 360 / POLARPATTERN_COUNT), mode=Mode.SUBTRACT)


solid = part.part
